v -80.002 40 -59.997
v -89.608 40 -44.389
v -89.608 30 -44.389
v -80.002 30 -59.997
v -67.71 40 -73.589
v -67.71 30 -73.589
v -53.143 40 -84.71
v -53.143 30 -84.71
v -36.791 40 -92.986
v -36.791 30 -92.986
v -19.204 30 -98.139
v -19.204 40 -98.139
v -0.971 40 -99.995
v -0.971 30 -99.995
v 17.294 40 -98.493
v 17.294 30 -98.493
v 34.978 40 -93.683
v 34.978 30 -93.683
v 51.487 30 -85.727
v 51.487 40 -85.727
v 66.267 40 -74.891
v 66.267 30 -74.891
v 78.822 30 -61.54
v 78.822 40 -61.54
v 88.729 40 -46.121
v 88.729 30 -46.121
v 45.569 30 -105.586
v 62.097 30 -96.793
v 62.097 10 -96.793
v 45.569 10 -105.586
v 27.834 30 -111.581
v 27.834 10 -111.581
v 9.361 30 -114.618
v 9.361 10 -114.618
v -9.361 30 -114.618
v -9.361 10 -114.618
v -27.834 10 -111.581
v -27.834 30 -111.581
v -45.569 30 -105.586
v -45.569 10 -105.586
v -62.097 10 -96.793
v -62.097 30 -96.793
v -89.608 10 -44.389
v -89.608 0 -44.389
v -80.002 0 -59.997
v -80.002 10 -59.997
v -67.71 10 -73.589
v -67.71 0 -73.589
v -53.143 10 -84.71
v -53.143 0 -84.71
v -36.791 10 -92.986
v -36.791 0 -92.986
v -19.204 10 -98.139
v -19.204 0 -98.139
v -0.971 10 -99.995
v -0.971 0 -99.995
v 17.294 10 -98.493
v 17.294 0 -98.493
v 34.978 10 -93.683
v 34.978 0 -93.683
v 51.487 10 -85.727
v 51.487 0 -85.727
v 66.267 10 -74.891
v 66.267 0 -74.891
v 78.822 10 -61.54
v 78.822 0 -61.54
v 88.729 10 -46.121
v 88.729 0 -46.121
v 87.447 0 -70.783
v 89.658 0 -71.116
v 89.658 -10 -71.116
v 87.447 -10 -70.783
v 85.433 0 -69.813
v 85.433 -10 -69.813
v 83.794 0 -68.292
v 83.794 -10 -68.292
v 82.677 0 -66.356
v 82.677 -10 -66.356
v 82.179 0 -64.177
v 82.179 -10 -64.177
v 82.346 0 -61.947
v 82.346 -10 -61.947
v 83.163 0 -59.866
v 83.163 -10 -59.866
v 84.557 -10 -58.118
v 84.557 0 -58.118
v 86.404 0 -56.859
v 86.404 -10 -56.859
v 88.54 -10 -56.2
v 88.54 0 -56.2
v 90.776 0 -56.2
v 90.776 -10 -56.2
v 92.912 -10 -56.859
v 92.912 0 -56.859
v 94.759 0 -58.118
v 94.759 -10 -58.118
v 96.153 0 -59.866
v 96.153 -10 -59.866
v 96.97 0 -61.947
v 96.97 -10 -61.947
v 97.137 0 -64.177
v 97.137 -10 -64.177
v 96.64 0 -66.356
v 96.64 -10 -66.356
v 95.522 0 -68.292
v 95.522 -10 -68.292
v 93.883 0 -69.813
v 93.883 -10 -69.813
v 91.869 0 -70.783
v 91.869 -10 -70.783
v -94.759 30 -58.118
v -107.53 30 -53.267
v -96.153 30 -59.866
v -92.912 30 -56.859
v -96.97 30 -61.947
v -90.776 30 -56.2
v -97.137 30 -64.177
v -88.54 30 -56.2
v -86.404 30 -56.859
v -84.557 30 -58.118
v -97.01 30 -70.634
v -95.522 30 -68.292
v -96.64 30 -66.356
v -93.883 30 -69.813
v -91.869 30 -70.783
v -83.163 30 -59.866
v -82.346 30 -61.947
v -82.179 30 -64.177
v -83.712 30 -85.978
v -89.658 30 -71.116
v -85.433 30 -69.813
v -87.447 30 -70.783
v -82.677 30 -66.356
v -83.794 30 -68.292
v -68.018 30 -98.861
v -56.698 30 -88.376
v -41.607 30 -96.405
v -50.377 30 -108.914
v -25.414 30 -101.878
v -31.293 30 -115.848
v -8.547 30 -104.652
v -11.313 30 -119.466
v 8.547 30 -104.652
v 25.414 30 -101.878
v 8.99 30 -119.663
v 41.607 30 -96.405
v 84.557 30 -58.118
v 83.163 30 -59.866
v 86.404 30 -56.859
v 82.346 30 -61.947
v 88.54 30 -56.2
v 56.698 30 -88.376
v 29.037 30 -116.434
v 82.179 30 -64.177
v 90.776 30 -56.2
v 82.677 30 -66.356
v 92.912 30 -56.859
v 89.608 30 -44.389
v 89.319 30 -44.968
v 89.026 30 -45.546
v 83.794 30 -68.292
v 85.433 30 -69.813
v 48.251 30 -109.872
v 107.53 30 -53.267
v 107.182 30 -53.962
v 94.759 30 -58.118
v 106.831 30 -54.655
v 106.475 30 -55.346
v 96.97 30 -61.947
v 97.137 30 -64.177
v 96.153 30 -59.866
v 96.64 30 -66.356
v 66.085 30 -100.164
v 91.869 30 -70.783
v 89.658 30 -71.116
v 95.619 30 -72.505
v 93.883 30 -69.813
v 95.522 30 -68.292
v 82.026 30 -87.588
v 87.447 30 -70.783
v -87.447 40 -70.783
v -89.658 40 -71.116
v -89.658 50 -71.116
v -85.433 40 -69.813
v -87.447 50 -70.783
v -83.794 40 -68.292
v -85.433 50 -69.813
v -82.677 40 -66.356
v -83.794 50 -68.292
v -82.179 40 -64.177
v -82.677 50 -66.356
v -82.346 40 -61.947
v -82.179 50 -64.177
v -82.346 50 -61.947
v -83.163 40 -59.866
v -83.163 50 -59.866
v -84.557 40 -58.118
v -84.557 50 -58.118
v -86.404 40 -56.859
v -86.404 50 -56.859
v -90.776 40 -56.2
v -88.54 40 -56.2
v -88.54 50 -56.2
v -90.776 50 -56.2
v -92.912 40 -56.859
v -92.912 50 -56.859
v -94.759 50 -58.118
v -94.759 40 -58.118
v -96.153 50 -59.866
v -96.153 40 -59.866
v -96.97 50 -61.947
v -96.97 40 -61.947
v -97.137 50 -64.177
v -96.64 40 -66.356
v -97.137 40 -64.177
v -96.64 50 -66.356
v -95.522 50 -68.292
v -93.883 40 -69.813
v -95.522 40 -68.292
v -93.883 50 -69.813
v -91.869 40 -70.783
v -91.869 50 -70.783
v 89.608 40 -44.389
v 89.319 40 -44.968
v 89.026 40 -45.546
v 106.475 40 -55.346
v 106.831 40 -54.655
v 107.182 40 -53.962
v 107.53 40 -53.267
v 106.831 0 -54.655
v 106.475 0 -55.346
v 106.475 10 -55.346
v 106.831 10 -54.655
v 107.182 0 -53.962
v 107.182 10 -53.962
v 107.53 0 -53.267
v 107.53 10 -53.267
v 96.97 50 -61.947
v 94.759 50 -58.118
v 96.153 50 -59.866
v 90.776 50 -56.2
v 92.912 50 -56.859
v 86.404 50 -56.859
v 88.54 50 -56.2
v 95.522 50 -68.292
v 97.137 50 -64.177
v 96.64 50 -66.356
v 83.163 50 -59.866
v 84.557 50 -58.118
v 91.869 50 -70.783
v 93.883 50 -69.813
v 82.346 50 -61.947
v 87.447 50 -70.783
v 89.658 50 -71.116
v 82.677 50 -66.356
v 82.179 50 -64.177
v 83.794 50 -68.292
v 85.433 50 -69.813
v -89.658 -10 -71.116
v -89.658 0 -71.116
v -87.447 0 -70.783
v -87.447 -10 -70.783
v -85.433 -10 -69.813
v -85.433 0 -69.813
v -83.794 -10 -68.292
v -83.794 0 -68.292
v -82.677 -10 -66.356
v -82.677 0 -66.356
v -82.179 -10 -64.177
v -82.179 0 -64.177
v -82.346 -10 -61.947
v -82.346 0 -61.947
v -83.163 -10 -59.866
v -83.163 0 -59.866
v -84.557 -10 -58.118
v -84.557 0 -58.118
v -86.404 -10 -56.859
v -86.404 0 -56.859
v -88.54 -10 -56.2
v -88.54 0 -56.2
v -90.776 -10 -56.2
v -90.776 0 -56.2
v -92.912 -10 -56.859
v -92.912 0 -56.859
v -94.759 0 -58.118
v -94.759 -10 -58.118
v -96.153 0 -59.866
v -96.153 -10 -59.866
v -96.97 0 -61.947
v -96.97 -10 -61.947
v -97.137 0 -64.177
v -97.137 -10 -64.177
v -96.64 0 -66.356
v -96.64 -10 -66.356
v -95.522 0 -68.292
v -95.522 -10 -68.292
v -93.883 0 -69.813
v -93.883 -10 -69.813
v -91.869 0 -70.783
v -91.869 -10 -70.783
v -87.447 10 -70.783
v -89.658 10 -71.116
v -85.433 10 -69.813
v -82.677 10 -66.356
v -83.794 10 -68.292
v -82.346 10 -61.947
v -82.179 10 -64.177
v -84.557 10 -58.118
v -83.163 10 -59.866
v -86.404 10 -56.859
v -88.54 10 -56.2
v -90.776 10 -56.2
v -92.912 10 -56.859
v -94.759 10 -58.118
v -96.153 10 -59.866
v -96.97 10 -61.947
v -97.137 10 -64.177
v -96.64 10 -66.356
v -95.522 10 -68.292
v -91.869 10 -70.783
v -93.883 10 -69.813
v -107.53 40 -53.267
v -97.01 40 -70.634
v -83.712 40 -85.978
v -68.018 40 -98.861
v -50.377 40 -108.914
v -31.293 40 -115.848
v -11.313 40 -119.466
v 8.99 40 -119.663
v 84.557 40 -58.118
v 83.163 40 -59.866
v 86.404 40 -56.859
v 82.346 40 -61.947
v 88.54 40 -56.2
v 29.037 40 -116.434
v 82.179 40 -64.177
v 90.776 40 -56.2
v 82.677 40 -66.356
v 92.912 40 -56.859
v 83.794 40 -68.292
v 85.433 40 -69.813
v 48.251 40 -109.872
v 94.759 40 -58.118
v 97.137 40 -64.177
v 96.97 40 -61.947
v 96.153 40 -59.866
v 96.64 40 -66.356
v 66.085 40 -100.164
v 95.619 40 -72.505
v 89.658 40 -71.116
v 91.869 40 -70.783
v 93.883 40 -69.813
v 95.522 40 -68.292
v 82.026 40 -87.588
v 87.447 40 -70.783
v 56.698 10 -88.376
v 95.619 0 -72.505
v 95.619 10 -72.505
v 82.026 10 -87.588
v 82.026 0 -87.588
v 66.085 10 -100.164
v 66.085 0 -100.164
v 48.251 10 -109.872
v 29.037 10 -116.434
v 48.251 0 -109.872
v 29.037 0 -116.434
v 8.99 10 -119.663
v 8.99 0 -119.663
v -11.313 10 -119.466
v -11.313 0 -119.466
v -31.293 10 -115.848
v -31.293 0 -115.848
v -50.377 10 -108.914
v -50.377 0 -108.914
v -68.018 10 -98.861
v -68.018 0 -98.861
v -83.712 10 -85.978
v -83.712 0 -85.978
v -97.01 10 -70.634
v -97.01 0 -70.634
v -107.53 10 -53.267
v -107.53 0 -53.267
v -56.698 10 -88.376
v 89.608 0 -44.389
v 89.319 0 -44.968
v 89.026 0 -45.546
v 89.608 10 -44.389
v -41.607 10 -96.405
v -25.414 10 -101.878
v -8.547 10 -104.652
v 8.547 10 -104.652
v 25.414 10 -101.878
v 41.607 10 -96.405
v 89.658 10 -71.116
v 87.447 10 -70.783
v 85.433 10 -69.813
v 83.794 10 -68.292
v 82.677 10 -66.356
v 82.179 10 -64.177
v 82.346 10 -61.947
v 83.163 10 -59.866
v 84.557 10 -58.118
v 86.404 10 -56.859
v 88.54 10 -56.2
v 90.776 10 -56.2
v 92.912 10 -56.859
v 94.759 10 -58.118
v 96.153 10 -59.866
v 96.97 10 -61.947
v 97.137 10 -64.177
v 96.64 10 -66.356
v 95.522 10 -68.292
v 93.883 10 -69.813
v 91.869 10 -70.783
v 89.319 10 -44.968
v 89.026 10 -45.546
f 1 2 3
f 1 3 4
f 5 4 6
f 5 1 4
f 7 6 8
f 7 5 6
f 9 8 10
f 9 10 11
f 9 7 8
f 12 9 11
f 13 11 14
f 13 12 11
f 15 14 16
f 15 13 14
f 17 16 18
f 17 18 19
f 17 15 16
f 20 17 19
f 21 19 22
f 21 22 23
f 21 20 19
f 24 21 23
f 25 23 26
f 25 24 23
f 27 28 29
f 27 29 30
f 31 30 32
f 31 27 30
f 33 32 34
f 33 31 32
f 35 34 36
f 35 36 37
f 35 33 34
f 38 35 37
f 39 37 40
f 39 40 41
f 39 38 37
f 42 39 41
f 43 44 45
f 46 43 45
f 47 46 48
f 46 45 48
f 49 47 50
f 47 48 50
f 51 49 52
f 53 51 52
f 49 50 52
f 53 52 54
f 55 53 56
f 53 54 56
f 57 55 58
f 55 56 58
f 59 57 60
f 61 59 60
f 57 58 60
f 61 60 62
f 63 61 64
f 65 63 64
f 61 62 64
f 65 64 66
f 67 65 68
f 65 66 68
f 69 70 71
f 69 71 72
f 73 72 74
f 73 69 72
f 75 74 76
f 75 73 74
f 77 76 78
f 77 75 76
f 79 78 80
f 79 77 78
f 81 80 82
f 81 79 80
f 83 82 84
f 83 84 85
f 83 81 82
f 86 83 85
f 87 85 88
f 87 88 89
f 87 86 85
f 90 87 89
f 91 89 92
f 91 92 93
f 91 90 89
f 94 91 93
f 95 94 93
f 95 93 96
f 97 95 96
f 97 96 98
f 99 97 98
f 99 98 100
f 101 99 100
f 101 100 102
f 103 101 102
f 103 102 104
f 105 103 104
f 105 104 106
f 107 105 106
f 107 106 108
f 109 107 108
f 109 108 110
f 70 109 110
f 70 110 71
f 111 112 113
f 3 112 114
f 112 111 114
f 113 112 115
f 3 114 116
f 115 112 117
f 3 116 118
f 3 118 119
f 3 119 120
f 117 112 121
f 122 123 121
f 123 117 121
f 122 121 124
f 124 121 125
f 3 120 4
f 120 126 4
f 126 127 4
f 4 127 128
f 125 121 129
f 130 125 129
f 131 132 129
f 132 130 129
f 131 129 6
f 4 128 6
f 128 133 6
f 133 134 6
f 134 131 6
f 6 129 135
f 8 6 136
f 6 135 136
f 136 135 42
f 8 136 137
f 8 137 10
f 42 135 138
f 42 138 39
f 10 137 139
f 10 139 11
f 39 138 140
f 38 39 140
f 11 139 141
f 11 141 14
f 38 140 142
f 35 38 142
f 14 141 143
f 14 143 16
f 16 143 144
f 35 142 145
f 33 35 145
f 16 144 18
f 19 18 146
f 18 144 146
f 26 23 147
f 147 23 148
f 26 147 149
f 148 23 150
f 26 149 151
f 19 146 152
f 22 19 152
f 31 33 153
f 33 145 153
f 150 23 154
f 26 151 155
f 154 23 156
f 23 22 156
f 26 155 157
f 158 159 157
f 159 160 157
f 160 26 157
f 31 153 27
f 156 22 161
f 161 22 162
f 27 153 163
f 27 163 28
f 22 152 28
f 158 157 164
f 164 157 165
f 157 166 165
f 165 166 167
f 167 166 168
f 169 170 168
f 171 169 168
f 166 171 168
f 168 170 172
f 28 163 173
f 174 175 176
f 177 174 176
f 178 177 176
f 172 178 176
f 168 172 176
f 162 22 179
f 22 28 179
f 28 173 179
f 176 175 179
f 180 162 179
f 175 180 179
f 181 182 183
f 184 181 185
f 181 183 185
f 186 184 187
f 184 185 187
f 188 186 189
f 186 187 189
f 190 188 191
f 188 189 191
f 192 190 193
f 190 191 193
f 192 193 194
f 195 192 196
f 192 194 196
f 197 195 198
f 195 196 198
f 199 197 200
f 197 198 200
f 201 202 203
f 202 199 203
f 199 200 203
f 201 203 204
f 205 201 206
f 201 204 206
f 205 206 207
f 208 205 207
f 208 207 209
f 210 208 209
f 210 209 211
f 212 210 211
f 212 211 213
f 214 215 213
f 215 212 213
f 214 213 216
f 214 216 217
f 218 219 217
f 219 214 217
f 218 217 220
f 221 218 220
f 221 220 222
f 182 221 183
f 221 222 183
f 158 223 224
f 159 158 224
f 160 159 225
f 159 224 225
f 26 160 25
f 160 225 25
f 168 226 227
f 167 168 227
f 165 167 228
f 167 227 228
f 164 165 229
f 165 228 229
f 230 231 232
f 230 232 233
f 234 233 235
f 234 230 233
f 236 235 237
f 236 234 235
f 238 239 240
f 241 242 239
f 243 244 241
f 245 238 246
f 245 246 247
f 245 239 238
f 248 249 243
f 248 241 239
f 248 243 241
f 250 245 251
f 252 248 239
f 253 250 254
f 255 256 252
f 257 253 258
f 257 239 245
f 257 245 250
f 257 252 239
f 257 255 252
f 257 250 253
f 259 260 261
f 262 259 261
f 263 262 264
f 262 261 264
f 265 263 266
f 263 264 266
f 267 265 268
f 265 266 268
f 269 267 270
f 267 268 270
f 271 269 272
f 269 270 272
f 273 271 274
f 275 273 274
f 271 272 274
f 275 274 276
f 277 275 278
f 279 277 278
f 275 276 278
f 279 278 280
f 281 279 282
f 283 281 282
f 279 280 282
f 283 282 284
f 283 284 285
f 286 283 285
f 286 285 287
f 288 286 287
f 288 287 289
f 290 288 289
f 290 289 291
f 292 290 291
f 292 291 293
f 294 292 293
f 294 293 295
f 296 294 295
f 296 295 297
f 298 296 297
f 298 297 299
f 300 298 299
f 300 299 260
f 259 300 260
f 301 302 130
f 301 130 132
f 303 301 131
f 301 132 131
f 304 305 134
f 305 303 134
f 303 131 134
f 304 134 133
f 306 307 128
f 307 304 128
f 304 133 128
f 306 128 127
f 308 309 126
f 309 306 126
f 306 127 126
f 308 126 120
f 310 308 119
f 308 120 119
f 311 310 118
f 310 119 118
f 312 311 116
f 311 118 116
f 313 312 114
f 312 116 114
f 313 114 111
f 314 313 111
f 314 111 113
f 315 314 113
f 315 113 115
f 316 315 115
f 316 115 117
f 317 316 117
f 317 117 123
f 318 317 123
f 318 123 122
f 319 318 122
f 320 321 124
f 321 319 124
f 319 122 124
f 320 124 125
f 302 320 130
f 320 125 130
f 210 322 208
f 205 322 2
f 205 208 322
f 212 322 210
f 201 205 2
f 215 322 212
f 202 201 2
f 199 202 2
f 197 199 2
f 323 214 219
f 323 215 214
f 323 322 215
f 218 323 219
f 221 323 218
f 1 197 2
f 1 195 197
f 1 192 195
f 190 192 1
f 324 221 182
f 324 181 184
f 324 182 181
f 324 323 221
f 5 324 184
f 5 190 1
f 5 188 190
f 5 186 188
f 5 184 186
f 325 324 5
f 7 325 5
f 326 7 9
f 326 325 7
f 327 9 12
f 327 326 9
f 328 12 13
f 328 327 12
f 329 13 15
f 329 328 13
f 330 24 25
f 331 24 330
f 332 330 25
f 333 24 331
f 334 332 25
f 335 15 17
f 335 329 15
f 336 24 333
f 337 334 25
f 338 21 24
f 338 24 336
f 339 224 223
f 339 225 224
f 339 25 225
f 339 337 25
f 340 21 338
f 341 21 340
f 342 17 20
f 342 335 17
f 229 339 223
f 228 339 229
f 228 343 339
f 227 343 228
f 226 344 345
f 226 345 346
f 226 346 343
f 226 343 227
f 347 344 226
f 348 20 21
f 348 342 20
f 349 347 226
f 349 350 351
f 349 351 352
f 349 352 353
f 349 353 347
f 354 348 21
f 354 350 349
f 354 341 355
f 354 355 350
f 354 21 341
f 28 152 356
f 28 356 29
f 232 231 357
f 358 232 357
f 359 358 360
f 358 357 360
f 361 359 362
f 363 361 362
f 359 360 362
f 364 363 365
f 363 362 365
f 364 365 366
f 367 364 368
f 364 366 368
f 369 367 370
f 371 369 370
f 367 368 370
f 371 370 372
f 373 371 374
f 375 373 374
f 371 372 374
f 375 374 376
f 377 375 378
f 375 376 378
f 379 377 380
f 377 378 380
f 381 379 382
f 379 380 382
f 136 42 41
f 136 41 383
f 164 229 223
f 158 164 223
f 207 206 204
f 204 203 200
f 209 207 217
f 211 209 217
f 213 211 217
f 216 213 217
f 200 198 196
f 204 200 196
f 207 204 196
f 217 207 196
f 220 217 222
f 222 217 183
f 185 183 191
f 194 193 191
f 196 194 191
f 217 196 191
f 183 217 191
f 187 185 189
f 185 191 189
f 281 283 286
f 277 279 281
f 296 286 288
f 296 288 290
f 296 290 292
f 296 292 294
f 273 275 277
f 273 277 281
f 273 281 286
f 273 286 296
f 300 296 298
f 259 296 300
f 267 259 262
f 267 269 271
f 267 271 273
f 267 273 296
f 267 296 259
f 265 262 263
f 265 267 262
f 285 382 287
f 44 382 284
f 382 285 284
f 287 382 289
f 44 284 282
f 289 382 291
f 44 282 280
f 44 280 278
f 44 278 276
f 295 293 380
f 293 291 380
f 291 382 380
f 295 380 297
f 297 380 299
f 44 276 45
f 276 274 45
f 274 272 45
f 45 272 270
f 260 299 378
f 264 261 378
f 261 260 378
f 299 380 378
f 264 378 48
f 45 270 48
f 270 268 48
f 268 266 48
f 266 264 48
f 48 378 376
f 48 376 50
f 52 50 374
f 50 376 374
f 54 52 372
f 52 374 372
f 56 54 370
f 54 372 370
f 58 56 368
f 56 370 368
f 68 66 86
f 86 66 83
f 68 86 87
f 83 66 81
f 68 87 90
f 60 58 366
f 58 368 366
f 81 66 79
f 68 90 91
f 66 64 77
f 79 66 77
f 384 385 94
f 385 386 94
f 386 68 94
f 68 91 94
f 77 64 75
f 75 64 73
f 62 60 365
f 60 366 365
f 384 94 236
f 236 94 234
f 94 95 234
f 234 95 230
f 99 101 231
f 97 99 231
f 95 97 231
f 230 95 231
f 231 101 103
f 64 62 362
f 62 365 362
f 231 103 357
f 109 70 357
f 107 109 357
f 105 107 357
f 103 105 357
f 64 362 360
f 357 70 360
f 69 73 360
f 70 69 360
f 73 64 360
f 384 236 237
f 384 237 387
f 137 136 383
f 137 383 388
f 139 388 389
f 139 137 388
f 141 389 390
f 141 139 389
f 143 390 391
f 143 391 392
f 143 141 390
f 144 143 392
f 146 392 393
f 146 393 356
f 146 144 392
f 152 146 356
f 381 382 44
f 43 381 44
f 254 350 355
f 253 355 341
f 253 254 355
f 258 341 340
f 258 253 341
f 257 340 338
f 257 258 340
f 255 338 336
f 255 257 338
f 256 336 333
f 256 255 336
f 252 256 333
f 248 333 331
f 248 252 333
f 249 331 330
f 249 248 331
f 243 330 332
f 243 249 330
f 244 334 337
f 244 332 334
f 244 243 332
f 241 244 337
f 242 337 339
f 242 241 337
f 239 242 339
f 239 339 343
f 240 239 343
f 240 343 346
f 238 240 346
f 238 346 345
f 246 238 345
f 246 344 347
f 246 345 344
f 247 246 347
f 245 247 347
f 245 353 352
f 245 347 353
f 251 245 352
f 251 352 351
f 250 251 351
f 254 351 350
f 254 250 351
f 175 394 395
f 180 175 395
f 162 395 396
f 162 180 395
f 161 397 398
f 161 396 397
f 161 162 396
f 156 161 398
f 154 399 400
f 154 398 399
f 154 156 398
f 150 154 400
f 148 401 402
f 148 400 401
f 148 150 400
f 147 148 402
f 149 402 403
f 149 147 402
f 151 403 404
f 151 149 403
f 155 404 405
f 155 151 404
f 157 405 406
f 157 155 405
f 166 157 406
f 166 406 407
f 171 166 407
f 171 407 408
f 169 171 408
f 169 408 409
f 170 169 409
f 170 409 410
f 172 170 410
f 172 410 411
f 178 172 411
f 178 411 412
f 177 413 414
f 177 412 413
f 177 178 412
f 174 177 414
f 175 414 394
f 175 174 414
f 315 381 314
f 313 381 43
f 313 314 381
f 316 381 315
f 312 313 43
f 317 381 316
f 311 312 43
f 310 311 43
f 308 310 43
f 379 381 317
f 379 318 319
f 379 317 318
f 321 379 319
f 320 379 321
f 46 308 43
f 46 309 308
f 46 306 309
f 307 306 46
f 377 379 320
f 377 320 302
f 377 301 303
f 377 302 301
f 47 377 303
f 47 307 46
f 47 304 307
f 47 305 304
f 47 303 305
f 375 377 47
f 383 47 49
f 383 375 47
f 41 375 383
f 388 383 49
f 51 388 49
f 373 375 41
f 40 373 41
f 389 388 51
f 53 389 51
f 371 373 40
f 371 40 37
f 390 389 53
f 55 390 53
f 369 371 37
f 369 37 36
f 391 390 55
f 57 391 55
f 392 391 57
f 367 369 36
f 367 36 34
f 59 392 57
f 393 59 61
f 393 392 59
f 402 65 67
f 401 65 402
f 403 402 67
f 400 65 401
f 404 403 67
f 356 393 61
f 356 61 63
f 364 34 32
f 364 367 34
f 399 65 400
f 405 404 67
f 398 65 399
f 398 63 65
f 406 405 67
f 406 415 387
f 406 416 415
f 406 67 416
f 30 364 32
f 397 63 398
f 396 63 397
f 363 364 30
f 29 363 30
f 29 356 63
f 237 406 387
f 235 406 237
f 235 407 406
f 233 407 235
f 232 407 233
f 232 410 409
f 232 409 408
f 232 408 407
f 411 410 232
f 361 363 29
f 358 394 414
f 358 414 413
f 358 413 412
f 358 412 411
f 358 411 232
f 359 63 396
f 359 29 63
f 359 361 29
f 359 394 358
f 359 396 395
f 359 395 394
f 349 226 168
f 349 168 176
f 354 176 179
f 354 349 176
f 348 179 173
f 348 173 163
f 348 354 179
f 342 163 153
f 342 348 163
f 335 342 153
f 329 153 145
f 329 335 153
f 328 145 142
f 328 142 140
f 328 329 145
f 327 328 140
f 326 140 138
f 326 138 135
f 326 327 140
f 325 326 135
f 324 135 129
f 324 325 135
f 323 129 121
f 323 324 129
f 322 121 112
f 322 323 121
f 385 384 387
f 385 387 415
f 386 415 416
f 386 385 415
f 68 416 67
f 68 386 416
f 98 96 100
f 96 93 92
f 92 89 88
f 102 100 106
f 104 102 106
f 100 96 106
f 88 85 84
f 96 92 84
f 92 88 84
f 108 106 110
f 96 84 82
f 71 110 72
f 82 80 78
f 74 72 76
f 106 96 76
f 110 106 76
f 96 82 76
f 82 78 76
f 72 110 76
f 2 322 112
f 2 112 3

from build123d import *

# Parameters (mm, degrees)
BOSS_EXTRUDE1_DEPTH      = 10
BOSS_EXTRUDE2_DEPTH      = 10
BOSS_EXTRUDE3_DEPTH      = 10
BOSS_EXTRUDE3_DEPTH_BACK = 50
SKETCH3_R                = 7.5


with BuildPart() as part:
    # Sketch1 → Boss-Extrude1 (new body)
    with BuildSketch(Plane(origin=(0, 0, 0), x_dir=(1, 0, 0), z_dir=(0, 1, 0))):
        with BuildLine():
            Line((-107.529653027, 53.267004046), (-89.608044189, 44.389170038))
            ThreePointArc((-89.608044189, 44.389170038), (-0.97130255, 99.995282746), (88.728870826, 46.121442756))
            Line((88.728870826, 46.121442756), (106.474644991, 55.345731307))
            ThreePointArc((106.474644991, 55.345731307), (-1.16556306, 119.994339295), (-107.529653027, 53.267004046))
        make_face()
    extrude(amount=BOSS_EXTRUDE1_DEPTH)

    # Sketch2 → Boss-Extrude2 (add)
    with BuildSketch(Plane(origin=(0, 10, 0), x_dir=(1, 0, 0), z_dir=(0, 1, 0))):
        with BuildLine():
            Line((-62.097280291, 96.793221769), (-56.697516787, 88.376419876))
            ThreePointArc((-56.697516787, 88.376419876), (0, 105), (56.697516787, 88.376419876))
            Line((56.697516787, 88.376419876), (62.097280291, 96.793221769))
            ThreePointArc((62.097280291, 96.793221769), (0, 115), (-62.097280291, 96.793221769))
        make_face()
    extrude(amount=BOSS_EXTRUDE2_DEPTH)

    # Mirror1: part across plane


with BuildPart() as part_1:
    add(part.part)
    add(part.part.mirror(Plane.ZX.offset(20)))

    # Sketch3 → Boss-Extrude3 (add, two sides: drawn at the far end of the back side and taken through both)
    with BuildSketch(Plane.XZ.offset(-BOSS_EXTRUDE3_DEPTH_BACK)):
        with Locations(Location((-89.658117345, -63.616209095, 0), (0, 0, 270))):
            Circle(SKETCH3_R)
    extrude(amount=BOSS_EXTRUDE3_DEPTH + BOSS_EXTRUDE3_DEPTH_BACK)

    # Mirror2: part across plane


with BuildPart() as part_2:
    add(part_1.part)
    add(part_1.part.mirror(Plane(origin=(0, 0, 0), x_dir=(0, 0, 1), z_dir=(1, 0, 0))))


solid = part_2.part
